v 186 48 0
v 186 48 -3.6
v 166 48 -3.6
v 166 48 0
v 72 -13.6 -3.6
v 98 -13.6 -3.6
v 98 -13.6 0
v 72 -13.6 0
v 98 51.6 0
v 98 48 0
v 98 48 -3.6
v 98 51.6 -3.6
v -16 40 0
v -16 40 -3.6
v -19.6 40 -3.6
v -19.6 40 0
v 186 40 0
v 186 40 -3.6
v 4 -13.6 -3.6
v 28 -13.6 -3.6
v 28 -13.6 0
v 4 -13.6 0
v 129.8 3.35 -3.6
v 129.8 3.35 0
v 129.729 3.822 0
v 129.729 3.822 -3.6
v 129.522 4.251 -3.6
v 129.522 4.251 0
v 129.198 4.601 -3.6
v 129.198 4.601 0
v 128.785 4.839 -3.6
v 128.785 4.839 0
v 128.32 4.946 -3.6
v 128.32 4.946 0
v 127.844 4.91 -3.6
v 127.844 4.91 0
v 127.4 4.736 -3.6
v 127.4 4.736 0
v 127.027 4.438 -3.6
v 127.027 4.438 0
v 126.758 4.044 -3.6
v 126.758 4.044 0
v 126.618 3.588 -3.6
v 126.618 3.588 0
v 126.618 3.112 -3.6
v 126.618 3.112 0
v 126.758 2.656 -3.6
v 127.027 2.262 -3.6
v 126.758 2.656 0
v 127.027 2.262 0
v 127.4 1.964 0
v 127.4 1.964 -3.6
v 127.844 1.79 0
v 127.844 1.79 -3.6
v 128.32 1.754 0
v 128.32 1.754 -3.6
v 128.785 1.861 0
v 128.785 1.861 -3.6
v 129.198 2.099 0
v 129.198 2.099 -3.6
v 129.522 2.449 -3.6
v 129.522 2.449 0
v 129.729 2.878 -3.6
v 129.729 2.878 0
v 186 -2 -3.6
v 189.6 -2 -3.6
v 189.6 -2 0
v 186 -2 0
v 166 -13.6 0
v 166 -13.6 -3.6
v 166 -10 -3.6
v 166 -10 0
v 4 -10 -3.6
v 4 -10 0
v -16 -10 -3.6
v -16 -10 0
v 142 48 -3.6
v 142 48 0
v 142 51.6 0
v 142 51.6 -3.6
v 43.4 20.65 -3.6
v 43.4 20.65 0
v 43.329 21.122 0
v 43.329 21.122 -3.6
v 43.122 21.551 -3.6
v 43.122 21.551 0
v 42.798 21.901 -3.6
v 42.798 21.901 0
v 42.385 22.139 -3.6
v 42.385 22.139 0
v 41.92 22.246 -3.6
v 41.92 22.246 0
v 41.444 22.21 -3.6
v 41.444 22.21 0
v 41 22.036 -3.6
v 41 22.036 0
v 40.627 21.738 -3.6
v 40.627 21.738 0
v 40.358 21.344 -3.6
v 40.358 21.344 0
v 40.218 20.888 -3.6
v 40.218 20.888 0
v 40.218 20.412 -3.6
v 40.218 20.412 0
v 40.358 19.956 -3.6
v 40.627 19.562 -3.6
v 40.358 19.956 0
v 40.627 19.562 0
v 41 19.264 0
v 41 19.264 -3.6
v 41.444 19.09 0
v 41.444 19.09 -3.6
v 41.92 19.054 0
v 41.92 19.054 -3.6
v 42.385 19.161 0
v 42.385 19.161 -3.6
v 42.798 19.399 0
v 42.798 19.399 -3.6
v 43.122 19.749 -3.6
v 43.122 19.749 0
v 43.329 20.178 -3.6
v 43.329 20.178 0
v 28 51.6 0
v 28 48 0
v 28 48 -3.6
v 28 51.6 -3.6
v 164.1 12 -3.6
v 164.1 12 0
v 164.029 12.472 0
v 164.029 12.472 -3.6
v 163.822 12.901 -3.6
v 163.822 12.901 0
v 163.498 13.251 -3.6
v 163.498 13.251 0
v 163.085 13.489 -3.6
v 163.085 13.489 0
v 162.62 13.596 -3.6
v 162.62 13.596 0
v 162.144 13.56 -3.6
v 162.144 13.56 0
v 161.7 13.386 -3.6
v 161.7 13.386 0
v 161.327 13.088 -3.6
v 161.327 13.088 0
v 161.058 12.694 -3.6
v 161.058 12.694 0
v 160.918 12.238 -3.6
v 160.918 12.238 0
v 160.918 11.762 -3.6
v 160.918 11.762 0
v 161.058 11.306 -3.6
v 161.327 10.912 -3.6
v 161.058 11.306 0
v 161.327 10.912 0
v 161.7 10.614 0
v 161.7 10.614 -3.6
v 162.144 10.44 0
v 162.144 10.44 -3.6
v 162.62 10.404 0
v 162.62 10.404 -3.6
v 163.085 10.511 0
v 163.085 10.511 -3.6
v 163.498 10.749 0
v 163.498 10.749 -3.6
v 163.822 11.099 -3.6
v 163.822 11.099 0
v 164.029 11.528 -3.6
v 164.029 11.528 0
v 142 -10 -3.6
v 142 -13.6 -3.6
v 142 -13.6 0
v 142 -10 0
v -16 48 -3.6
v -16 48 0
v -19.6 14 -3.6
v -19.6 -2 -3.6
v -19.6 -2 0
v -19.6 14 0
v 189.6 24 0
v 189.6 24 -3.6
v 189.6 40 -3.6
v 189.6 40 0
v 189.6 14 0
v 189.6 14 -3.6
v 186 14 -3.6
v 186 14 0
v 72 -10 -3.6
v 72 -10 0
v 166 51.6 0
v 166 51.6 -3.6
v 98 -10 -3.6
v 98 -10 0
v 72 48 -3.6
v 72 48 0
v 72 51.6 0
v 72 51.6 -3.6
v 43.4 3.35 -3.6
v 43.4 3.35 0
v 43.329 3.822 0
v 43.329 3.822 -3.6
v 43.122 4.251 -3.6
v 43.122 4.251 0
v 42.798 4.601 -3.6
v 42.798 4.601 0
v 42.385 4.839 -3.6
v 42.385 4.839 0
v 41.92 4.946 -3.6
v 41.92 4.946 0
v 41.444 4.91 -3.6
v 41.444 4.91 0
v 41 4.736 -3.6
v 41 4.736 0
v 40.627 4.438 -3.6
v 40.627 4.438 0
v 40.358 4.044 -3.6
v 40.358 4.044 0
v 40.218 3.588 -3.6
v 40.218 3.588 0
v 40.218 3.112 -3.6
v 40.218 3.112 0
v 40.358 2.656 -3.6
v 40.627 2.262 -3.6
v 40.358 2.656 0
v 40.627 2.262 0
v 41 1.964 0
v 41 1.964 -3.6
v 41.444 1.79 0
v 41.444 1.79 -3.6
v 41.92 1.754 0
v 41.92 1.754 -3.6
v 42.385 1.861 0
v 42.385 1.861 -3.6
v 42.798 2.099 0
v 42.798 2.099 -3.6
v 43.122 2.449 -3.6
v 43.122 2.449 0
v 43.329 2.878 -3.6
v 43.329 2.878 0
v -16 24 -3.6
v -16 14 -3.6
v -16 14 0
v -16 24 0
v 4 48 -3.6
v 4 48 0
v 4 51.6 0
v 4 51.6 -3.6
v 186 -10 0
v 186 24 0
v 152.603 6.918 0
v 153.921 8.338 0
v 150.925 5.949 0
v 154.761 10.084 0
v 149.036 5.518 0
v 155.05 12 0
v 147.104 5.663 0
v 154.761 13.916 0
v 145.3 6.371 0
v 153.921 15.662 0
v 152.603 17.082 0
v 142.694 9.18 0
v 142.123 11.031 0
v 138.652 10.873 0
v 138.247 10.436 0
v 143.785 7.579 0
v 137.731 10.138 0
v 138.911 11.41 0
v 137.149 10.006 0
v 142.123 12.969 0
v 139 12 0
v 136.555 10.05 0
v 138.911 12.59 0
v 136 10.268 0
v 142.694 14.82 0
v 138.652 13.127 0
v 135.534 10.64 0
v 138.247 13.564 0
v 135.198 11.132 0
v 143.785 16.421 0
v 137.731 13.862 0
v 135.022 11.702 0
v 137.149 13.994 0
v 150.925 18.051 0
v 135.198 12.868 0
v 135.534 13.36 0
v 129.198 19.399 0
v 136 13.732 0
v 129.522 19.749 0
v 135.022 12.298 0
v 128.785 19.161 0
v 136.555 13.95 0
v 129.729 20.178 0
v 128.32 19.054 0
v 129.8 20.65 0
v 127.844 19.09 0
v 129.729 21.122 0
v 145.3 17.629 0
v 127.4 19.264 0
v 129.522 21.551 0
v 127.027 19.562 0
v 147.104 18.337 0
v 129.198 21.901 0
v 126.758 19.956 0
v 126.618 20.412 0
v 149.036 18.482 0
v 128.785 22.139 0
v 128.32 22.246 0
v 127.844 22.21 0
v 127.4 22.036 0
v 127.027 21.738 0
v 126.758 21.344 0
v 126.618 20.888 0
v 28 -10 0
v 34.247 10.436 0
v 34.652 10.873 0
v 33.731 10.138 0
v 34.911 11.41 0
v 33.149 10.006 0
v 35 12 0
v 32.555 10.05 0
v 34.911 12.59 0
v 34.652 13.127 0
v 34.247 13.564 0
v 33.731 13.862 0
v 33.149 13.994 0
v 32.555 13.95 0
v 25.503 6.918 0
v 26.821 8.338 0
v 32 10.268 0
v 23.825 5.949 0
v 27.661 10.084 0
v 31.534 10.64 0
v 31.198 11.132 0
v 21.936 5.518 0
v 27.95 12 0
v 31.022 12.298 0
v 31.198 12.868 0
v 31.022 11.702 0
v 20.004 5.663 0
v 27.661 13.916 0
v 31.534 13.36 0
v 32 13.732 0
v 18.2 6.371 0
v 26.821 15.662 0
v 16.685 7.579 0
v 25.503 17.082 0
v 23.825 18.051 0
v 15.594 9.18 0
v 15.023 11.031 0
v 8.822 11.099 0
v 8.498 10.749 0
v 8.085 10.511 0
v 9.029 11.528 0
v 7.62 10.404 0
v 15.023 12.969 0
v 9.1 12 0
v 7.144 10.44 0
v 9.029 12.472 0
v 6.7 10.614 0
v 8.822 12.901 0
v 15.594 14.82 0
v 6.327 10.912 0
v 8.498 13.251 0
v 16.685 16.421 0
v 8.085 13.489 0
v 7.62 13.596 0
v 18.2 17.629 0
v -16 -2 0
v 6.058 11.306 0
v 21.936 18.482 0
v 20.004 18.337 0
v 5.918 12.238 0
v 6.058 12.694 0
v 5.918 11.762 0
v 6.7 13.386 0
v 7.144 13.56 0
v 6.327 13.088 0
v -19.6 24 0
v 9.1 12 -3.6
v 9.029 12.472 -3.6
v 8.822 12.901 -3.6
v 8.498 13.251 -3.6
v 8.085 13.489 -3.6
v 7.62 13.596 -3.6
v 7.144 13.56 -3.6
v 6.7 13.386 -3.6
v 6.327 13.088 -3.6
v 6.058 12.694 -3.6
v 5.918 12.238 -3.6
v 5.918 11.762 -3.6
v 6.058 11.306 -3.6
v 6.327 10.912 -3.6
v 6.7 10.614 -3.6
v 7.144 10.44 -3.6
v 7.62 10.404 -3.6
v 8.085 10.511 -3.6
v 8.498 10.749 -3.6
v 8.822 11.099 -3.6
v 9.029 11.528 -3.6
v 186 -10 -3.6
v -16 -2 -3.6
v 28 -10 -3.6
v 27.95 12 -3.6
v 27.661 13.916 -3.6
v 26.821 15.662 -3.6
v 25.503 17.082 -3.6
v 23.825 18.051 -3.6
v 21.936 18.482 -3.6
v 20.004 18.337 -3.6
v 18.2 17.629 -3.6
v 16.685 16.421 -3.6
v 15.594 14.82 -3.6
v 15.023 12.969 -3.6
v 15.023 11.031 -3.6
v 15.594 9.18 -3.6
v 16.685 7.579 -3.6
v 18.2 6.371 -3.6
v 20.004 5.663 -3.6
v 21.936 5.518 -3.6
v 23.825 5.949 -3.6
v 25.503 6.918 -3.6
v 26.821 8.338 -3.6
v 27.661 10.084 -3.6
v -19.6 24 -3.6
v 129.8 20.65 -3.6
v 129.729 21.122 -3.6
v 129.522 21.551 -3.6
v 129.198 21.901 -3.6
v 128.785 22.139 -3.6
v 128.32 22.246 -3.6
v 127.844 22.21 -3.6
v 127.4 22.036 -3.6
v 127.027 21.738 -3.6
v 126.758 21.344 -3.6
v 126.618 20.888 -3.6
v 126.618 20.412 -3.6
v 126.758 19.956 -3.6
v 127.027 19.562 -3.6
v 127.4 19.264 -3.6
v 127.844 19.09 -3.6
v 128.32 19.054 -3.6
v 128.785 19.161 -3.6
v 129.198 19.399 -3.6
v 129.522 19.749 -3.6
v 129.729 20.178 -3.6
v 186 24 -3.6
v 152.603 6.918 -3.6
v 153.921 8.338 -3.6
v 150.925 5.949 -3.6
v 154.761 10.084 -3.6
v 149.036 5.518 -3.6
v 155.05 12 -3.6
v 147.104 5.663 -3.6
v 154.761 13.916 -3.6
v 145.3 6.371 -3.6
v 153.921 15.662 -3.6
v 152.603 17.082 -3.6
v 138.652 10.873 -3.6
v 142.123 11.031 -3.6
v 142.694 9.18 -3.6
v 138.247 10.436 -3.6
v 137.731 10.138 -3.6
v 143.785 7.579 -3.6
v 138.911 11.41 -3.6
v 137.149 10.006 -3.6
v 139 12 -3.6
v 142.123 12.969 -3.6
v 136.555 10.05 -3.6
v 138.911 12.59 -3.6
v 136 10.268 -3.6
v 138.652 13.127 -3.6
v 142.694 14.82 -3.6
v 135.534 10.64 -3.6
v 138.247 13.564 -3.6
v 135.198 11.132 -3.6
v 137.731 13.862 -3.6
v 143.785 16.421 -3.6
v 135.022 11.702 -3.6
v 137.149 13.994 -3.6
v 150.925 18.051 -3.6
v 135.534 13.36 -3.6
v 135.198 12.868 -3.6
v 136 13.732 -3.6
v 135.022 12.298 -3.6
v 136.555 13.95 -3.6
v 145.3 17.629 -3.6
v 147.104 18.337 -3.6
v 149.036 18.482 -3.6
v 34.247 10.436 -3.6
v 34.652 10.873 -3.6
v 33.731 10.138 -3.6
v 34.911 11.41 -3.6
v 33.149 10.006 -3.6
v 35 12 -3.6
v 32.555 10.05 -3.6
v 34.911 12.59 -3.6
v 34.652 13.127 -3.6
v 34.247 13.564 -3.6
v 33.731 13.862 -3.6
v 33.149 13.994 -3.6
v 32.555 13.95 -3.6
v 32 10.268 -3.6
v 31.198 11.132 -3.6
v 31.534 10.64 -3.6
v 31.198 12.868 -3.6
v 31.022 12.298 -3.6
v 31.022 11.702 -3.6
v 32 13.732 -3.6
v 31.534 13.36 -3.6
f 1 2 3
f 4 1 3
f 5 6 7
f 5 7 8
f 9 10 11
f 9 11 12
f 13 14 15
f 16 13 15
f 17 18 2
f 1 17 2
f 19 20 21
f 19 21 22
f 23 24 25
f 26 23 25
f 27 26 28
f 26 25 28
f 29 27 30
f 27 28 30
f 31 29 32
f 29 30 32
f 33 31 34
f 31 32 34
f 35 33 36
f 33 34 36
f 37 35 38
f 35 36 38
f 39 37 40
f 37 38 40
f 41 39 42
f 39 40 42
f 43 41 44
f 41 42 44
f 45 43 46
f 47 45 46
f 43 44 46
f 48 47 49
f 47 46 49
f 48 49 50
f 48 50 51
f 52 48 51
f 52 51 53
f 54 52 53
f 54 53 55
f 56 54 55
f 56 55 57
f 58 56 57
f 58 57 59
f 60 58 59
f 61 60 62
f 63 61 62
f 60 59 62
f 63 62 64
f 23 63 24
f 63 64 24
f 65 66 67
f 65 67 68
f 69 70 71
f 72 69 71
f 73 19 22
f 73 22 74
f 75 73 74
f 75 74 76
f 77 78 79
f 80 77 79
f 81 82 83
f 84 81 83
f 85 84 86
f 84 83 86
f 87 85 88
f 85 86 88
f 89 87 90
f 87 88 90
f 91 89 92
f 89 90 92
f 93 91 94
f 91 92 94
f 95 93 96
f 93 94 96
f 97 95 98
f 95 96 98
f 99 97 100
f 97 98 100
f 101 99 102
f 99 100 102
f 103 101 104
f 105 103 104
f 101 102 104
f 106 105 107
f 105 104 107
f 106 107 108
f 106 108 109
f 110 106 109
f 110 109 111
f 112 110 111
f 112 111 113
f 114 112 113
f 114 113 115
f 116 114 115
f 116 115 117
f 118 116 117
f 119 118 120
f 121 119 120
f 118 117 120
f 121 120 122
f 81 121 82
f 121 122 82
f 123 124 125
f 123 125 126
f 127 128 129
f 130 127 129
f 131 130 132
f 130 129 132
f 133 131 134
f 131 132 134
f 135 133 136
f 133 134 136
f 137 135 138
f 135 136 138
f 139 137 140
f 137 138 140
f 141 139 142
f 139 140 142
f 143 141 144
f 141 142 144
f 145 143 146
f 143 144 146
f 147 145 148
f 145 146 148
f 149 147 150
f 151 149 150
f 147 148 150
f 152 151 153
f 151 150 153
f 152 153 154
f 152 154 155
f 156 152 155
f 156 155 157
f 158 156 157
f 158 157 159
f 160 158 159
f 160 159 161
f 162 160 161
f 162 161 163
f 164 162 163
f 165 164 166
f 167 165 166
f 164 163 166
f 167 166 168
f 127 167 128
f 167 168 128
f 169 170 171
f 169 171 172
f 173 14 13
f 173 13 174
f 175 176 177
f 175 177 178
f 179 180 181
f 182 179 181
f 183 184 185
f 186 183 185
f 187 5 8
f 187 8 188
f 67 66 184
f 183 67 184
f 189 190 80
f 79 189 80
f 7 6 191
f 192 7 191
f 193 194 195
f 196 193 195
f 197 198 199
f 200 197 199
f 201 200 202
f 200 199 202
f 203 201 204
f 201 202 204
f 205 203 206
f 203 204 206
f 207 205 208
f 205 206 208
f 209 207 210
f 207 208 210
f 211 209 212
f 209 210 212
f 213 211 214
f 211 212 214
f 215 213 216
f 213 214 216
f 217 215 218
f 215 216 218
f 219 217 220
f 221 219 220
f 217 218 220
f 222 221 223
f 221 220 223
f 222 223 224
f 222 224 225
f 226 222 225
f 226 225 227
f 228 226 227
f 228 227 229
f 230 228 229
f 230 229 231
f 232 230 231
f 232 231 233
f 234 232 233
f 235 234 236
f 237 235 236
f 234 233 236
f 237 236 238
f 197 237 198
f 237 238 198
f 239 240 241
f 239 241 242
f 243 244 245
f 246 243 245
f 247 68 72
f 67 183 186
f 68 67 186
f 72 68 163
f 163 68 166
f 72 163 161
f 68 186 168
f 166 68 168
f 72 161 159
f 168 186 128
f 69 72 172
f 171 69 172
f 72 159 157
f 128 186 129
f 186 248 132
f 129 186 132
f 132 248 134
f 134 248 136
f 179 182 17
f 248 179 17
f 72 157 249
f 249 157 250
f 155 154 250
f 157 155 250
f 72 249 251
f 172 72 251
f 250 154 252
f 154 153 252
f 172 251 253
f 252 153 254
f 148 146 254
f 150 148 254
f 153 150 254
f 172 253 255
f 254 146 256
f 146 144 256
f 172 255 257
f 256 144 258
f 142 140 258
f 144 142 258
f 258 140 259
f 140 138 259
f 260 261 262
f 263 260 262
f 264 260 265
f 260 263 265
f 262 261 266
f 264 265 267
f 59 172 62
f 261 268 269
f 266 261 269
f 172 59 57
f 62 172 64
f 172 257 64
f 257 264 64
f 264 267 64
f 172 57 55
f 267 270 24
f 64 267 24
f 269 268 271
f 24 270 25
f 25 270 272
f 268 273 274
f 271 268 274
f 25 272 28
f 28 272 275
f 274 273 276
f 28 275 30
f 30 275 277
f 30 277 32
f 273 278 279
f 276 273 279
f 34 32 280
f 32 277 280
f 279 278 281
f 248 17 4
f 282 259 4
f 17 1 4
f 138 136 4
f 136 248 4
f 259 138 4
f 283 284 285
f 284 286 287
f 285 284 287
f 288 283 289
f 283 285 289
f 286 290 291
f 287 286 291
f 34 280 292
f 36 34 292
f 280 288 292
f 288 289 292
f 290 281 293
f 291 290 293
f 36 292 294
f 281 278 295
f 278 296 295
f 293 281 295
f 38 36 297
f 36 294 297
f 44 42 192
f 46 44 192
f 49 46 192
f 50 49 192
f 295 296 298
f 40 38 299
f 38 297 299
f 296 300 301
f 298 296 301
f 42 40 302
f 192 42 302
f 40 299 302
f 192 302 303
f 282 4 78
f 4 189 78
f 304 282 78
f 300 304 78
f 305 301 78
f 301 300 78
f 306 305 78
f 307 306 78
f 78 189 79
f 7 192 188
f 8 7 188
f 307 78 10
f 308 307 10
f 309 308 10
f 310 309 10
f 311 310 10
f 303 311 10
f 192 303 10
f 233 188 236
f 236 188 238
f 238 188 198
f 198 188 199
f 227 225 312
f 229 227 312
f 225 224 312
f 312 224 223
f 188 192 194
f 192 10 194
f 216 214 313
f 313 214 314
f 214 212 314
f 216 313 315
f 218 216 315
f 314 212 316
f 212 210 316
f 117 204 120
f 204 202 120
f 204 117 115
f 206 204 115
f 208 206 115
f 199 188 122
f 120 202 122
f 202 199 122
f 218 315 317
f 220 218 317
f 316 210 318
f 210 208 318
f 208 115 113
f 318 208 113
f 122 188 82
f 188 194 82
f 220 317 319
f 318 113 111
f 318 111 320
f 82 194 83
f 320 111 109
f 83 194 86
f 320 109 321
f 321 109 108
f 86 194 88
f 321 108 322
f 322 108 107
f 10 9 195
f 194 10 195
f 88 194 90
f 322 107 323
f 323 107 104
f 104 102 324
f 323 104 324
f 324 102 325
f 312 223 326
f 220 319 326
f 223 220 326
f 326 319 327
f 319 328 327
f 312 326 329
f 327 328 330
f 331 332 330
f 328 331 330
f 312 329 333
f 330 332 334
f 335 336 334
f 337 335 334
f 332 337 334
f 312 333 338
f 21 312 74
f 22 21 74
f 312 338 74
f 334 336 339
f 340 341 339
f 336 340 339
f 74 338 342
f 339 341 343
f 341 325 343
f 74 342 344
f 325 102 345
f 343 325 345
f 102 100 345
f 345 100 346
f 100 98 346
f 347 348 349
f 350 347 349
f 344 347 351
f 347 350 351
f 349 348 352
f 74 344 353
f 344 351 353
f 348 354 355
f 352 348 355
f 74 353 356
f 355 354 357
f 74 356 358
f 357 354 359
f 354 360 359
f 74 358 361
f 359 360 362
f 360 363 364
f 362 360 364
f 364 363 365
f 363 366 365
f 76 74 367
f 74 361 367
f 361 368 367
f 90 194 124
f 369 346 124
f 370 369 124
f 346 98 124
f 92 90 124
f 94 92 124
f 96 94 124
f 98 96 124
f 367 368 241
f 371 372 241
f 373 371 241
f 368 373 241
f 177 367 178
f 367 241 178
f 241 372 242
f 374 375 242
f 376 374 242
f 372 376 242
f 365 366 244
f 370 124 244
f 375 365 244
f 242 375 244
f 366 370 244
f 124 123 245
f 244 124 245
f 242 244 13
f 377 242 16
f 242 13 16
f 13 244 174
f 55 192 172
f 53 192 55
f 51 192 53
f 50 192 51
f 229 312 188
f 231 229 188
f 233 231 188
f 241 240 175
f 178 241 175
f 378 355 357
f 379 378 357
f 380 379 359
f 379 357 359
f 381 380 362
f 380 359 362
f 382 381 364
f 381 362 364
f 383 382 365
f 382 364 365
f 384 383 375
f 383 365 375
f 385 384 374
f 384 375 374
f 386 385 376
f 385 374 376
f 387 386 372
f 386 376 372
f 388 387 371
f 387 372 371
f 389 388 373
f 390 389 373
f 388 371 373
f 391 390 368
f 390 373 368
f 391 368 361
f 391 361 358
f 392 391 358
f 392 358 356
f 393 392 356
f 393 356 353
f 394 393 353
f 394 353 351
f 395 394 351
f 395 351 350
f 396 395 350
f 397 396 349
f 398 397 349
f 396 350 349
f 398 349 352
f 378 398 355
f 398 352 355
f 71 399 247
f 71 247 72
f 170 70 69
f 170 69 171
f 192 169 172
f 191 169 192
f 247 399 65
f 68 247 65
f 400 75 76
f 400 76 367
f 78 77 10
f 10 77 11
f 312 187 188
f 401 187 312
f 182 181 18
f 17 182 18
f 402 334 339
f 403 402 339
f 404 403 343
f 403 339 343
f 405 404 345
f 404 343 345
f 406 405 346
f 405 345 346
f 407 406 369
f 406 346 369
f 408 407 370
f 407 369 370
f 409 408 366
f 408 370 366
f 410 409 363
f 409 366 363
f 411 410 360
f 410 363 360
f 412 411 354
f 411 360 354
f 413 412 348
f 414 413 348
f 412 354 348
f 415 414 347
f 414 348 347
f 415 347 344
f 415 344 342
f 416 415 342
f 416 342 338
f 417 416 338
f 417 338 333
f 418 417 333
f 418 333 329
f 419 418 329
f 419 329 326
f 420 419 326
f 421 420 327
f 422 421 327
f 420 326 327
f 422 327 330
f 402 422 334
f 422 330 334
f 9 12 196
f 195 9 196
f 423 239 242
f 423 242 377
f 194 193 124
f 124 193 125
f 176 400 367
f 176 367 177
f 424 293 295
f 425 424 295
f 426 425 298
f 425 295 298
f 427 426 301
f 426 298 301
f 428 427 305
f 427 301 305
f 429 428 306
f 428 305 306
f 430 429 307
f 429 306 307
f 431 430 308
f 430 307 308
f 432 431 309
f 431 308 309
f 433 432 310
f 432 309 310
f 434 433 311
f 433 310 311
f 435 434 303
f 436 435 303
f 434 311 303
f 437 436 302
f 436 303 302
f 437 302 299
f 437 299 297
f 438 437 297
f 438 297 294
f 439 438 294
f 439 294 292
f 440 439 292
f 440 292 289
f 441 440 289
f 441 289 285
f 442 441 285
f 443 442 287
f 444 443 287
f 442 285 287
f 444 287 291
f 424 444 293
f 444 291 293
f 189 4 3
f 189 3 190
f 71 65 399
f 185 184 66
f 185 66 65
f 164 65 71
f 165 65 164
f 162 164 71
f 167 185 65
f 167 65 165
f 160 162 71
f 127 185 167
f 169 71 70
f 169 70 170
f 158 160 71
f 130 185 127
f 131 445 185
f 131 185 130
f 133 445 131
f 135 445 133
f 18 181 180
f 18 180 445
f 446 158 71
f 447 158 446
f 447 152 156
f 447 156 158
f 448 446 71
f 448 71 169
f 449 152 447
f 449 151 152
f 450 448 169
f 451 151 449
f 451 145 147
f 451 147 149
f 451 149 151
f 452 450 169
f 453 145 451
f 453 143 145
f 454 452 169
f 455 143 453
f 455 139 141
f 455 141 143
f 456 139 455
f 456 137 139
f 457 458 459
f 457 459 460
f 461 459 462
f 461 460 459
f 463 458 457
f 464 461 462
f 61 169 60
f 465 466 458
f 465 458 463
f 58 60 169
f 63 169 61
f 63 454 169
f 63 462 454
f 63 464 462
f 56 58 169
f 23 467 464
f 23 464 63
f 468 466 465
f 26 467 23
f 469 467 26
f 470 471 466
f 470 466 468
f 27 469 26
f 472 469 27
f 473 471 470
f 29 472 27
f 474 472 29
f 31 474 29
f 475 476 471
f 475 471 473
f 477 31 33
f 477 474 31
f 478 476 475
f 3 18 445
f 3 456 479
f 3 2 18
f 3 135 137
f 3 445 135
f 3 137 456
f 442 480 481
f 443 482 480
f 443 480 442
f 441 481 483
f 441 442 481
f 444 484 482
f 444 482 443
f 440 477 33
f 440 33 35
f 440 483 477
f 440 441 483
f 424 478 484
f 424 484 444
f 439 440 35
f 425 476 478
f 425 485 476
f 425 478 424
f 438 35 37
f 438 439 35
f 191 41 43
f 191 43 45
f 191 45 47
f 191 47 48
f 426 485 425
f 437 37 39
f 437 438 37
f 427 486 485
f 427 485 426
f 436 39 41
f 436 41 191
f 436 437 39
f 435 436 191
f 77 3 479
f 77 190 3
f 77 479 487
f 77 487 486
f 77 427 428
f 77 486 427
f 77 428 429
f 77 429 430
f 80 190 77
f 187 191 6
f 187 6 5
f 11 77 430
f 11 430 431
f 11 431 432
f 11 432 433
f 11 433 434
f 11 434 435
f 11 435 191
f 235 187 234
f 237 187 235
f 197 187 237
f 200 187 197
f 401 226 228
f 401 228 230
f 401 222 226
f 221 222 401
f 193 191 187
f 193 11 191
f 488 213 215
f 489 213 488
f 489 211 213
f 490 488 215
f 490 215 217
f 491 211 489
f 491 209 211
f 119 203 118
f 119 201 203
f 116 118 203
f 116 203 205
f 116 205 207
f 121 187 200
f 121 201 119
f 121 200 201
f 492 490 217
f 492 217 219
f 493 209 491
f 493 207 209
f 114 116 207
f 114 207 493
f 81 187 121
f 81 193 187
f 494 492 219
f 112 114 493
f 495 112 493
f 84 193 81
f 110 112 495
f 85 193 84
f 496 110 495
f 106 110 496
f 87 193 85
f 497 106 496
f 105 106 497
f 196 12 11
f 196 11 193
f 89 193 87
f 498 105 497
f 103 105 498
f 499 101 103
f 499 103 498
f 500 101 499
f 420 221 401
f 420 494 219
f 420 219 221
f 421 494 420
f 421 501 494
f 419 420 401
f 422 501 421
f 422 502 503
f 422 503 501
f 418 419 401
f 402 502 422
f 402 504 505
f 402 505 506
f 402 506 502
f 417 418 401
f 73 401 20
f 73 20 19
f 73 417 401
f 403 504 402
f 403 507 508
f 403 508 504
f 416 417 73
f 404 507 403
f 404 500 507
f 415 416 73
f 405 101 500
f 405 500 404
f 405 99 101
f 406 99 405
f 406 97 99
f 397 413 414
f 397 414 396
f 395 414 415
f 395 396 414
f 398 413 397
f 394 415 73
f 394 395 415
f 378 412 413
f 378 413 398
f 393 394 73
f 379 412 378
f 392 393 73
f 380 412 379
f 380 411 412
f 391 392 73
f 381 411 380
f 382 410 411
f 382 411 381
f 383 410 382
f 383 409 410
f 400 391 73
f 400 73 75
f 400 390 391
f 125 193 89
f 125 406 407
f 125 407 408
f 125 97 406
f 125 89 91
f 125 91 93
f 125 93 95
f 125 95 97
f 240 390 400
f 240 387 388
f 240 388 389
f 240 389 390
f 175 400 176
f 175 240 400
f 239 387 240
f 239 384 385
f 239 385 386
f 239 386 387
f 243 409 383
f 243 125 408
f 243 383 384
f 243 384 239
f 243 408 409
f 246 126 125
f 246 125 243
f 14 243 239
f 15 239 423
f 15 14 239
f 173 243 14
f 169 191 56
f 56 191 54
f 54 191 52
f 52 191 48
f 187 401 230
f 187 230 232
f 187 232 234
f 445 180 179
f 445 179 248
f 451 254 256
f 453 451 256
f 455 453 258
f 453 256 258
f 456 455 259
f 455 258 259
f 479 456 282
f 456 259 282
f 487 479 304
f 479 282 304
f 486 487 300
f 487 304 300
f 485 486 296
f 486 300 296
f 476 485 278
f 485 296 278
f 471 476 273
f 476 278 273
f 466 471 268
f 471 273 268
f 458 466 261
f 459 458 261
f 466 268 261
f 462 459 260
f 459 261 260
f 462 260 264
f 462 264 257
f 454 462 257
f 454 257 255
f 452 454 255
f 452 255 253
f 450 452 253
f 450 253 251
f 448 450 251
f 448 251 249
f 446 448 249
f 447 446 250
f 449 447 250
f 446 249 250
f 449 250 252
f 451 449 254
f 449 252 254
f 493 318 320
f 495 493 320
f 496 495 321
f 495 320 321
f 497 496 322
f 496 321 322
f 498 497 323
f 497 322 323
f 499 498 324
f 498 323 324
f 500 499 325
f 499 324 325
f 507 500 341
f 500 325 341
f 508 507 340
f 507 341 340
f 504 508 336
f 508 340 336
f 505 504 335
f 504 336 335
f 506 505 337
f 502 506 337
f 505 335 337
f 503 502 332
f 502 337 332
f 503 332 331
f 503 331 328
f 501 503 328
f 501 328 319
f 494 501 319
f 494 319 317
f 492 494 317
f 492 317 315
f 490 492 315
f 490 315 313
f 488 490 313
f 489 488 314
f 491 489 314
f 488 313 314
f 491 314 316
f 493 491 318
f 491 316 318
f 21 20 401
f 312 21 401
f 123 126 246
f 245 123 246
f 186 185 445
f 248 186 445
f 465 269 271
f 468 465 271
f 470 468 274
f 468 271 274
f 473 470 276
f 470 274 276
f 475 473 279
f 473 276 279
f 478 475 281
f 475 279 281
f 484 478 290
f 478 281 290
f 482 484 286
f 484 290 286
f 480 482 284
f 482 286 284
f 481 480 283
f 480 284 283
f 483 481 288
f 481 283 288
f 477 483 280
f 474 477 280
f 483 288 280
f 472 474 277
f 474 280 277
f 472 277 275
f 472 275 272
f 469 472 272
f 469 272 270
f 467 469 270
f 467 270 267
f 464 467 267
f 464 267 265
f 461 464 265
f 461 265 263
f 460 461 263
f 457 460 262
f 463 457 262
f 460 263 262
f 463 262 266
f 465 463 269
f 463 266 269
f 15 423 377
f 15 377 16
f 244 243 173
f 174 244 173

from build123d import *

# Parameters (mm, degrees)
SKETCH_1_W             = 170
SKETCH_1_H             = 48
SKETCH_1_R             = 2
SKETCH_1_R_2           = 6.5
SKETCH_1_R_3           = 1.6
SM_BASE_FLANGE_1_DEPTH = 3.6
SKETCH_7_W             = 16
SKETCH_7_H             = 48
EXTRUDE_1_DEPTH        = 3.6
SKETCH_8_W             = 202
SKETCH_8_H             = 10
EXTRUDE_2_DEPTH        = 3.6
SKETCH_9_W             = 3.6
SKETCH_9_H             = 16
SKETCH_9_W_2           = 24
SKETCH_9_H_2           = 3.6
SKETCH_9_W_3           = 26
EXTRUDE_3_DEPTH        = 3.6


# Sheet-metal steps are written as plain solids
with BuildPart() as part:
    # Sketch 1 → Базовая кромка1 (new body)
    with BuildSketch(Plane.XY):
        with Locations((85, 24)):
            Rectangle(SKETCH_1_W, SKETCH_1_H)
        with Locations((137, 12)):
            Circle(SKETCH_1_R, mode=Mode.SUBTRACT)
        with Locations((33, 12)):
            Circle(SKETCH_1_R, mode=Mode.SUBTRACT)
        with Locations((148.55, 12)):
            Circle(SKETCH_1_R_2, mode=Mode.SUBTRACT)
        with Locations((21.45, 12)):
            Circle(SKETCH_1_R_2, mode=Mode.SUBTRACT)
        with Locations((128.2, 20.65)):
            Circle(SKETCH_1_R_3, mode=Mode.SUBTRACT)
        with Locations((128.2, 3.35)):
            Circle(SKETCH_1_R_3, mode=Mode.SUBTRACT)
        with Locations((41.8, 20.65)):
            Circle(SKETCH_1_R_3, mode=Mode.SUBTRACT)
        with Locations((41.8, 3.35)):
            Circle(SKETCH_1_R_3, mode=Mode.SUBTRACT)
        with Locations((162.5, 12)):
            Circle(SKETCH_1_R_3, mode=Mode.SUBTRACT)
        with Locations((7.5, 12)):
            Circle(SKETCH_1_R_3, mode=Mode.SUBTRACT)
    extrude(amount=-SM_BASE_FLANGE_1_DEPTH)

    # Эскиз7 → Бобышка-Вытянуть1 (add)
    with BuildSketch(Plane(origin=(0, 0, -3.6), x_dir=(-1, 0, 0), z_dir=(0, 0, -1))):
        with Locations((-178, 24)):
            Rectangle(SKETCH_7_W, SKETCH_7_H)
        with Locations((8, 24)):
            Rectangle(SKETCH_7_W, SKETCH_7_H)
    extrude(amount=-EXTRUDE_1_DEPTH)

    # Эскиз8 → Бобышка-Вытянуть2 (add)
    with BuildSketch(Plane(origin=(0, 0, -3.6), x_dir=(-1, 0, 0), z_dir=(0, 0, -1))):
        with Locations((-85, -5)):
            Rectangle(SKETCH_8_W, SKETCH_8_H)
    extrude(amount=-EXTRUDE_2_DEPTH)

    # Эскиз9 → Бобышка-Вытянуть3 (add)
    with BuildSketch(Plane(origin=(0, 0, -3.6), x_dir=(-1, 0, 0), z_dir=(0, 0, -1))):
        with Locations((-187.8, 32)):
            Rectangle(SKETCH_9_W, SKETCH_9_H)
        with Locations((-187.8, 6)):
            Rectangle(SKETCH_9_W, SKETCH_9_H)
        with Locations((-154, 49.8)):
            Rectangle(SKETCH_9_W_2, SKETCH_9_H_2)
        with Locations((-85, 49.8)):
            Rectangle(SKETCH_9_W_3, SKETCH_9_H_2)
        with Locations((-16, 49.8)):
            Rectangle(SKETCH_9_W_2, SKETCH_9_H_2)
        with Locations((17.8, 32)):
            Rectangle(SKETCH_9_W, SKETCH_9_H)
        with Locations((17.8, 6)):
            Rectangle(SKETCH_9_W, SKETCH_9_H)
        with Locations((-16, -11.8)):
            Rectangle(SKETCH_9_W_2, SKETCH_9_H_2)
        with Locations((-85, -11.8)):
            Rectangle(SKETCH_9_W_3, SKETCH_9_H_2)
        with Locations((-154, -11.8)):
            Rectangle(SKETCH_9_W_2, SKETCH_9_H_2)
    extrude(amount=-EXTRUDE_3_DEPTH)


solid = part.part
